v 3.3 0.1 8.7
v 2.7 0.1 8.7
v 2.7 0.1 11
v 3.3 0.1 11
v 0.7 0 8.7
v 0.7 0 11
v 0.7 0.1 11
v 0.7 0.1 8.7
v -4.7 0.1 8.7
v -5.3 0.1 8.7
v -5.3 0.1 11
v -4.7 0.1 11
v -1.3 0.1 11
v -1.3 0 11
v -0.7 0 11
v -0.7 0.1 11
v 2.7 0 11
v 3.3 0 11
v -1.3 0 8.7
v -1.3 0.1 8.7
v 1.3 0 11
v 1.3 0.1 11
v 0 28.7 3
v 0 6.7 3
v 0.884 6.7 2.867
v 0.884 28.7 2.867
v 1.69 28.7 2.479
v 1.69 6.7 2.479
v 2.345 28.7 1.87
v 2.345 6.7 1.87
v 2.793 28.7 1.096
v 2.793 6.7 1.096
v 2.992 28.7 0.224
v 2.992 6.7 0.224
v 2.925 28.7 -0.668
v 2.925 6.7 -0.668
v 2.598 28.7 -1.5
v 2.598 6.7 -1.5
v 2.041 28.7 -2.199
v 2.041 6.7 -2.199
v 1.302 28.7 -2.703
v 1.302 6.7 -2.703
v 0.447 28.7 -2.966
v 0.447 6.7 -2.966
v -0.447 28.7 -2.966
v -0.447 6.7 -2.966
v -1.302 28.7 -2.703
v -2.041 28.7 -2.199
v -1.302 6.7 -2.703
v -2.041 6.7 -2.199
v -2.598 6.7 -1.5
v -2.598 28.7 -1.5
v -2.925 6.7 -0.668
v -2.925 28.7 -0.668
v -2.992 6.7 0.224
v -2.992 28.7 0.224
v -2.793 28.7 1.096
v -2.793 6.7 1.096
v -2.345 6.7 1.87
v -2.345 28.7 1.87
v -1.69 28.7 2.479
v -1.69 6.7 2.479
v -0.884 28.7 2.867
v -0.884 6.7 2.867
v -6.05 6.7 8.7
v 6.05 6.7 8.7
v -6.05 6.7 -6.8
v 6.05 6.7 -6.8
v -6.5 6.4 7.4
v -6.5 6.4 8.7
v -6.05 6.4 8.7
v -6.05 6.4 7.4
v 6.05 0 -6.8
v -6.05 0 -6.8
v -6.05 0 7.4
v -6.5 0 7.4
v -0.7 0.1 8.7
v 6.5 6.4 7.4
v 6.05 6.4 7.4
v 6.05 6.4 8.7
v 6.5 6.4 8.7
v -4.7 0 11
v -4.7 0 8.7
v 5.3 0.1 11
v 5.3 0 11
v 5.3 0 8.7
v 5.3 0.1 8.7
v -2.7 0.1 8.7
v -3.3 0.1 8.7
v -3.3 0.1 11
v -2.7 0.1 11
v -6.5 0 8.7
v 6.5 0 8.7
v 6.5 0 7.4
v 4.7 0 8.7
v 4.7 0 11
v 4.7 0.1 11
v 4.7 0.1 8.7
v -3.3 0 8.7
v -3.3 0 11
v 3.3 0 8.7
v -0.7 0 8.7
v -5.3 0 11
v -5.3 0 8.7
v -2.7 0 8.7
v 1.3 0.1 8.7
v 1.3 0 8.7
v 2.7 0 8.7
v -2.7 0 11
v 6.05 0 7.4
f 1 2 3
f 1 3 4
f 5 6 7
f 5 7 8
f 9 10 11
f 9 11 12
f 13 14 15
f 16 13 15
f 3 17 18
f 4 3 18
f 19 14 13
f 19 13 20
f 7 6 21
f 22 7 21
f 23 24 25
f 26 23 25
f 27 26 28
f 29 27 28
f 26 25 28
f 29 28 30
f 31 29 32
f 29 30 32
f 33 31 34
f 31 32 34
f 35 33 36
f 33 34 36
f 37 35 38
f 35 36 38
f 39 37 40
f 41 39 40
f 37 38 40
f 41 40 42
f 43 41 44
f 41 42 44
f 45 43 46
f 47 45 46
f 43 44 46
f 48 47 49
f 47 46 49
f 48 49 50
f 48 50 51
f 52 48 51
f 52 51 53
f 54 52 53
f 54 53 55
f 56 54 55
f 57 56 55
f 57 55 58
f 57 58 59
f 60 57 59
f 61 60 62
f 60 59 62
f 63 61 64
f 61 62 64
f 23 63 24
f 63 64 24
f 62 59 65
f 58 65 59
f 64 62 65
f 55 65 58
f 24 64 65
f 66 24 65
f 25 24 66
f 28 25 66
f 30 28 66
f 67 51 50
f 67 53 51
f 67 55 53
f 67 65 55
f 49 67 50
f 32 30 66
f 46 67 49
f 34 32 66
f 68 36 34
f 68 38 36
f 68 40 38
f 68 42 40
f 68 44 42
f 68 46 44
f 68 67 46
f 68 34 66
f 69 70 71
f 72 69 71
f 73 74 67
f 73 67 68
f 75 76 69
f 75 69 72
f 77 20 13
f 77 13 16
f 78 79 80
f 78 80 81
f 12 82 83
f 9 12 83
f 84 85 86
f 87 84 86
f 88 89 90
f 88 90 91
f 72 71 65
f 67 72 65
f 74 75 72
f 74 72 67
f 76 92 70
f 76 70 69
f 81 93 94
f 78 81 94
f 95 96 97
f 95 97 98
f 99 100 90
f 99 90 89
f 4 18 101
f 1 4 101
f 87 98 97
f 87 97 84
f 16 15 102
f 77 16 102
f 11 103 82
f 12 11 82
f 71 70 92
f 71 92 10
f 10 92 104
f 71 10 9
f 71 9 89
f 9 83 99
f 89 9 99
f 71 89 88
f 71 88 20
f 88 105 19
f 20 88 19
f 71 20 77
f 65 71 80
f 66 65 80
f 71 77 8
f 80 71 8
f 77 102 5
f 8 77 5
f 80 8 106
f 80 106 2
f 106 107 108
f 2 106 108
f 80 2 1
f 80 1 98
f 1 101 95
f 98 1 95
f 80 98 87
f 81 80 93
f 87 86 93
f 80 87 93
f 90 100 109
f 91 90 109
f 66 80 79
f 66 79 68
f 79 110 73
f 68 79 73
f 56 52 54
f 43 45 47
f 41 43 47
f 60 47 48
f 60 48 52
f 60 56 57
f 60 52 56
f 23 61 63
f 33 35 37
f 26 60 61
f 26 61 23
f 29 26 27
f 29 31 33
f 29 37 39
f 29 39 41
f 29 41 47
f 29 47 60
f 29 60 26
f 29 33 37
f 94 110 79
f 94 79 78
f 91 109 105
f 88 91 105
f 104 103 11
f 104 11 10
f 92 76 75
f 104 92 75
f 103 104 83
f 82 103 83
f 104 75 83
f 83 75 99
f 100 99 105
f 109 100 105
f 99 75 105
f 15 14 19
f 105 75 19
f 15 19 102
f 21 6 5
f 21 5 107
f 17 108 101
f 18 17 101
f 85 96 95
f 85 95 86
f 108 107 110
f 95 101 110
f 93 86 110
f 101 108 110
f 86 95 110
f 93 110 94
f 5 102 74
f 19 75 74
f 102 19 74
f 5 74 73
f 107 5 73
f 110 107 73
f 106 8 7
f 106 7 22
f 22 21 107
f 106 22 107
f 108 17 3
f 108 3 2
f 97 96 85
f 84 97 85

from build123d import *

# Parameters (mm, degrees)
SKETCH1_W      = 12.1
SKETCH1_H      = 15.5
EXTRUDE1_DEPTH = 6.7
SKETCH5_W      = 13
SKETCH5_H      = 1.3
EXTRUDE5_DEPTH = 6.4
SKETCH6_W      = 0.6
SKETCH6_H      = 2.3
EXTRUDE6_DEPTH = 0.1
SKETCH7_R      = 3
EXTRUDE7_DEPTH = 22


with BuildPart() as part:
    # Sketch1 → Extrude1 (new body)
    with BuildSketch(Plane(origin=(0, 0, 0), x_dir=(1, 0, 0), z_dir=(0, 1, 0))):
        with Locations((0, -0.95)):
            Rectangle(SKETCH1_W, SKETCH1_H)
    extrude(amount=EXTRUDE1_DEPTH)

    # Sketch5 → Extrude5 (add)
    with BuildSketch(Plane(origin=(0, 0, 0), x_dir=(1, 0, 0), z_dir=(0, 1, 0))):
        with Locations((0, -8.05)):
            Rectangle(SKETCH5_W, SKETCH5_H)
    extrude(amount=EXTRUDE5_DEPTH)

    # Sketch6 → Extrude6 (add)
    with BuildSketch(Plane(origin=(0, 0, 0), x_dir=(1, 0, 0), z_dir=(0, 1, 0))):
        with Locations((-1, -9.85)):
            Rectangle(SKETCH6_W, SKETCH6_H)
        with Locations((-3, -9.85)):
            Rectangle(SKETCH6_W, SKETCH6_H)
        with Locations((-5, -9.85)):
            Rectangle(SKETCH6_W, SKETCH6_H)
        with Locations((5, -9.85)):
            Rectangle(SKETCH6_W, SKETCH6_H)
        with Locations((3, -9.85)):
            Rectangle(SKETCH6_W, SKETCH6_H)
        with Locations((1, -9.85)):
            Rectangle(SKETCH6_W, SKETCH6_H)
    extrude(amount=EXTRUDE6_DEPTH)

    # Sketch7 → Extrude7 (add)
    with BuildSketch(Plane(origin=(0, 6.7, 0), x_dir=(1, 0, 0), z_dir=(0, 1, 0))):
        with Locations(Location((0, 0, 0), (0, 0, 270))):
            Circle(SKETCH7_R)
    extrude(amount=EXTRUDE7_DEPTH)


solid = part.part
